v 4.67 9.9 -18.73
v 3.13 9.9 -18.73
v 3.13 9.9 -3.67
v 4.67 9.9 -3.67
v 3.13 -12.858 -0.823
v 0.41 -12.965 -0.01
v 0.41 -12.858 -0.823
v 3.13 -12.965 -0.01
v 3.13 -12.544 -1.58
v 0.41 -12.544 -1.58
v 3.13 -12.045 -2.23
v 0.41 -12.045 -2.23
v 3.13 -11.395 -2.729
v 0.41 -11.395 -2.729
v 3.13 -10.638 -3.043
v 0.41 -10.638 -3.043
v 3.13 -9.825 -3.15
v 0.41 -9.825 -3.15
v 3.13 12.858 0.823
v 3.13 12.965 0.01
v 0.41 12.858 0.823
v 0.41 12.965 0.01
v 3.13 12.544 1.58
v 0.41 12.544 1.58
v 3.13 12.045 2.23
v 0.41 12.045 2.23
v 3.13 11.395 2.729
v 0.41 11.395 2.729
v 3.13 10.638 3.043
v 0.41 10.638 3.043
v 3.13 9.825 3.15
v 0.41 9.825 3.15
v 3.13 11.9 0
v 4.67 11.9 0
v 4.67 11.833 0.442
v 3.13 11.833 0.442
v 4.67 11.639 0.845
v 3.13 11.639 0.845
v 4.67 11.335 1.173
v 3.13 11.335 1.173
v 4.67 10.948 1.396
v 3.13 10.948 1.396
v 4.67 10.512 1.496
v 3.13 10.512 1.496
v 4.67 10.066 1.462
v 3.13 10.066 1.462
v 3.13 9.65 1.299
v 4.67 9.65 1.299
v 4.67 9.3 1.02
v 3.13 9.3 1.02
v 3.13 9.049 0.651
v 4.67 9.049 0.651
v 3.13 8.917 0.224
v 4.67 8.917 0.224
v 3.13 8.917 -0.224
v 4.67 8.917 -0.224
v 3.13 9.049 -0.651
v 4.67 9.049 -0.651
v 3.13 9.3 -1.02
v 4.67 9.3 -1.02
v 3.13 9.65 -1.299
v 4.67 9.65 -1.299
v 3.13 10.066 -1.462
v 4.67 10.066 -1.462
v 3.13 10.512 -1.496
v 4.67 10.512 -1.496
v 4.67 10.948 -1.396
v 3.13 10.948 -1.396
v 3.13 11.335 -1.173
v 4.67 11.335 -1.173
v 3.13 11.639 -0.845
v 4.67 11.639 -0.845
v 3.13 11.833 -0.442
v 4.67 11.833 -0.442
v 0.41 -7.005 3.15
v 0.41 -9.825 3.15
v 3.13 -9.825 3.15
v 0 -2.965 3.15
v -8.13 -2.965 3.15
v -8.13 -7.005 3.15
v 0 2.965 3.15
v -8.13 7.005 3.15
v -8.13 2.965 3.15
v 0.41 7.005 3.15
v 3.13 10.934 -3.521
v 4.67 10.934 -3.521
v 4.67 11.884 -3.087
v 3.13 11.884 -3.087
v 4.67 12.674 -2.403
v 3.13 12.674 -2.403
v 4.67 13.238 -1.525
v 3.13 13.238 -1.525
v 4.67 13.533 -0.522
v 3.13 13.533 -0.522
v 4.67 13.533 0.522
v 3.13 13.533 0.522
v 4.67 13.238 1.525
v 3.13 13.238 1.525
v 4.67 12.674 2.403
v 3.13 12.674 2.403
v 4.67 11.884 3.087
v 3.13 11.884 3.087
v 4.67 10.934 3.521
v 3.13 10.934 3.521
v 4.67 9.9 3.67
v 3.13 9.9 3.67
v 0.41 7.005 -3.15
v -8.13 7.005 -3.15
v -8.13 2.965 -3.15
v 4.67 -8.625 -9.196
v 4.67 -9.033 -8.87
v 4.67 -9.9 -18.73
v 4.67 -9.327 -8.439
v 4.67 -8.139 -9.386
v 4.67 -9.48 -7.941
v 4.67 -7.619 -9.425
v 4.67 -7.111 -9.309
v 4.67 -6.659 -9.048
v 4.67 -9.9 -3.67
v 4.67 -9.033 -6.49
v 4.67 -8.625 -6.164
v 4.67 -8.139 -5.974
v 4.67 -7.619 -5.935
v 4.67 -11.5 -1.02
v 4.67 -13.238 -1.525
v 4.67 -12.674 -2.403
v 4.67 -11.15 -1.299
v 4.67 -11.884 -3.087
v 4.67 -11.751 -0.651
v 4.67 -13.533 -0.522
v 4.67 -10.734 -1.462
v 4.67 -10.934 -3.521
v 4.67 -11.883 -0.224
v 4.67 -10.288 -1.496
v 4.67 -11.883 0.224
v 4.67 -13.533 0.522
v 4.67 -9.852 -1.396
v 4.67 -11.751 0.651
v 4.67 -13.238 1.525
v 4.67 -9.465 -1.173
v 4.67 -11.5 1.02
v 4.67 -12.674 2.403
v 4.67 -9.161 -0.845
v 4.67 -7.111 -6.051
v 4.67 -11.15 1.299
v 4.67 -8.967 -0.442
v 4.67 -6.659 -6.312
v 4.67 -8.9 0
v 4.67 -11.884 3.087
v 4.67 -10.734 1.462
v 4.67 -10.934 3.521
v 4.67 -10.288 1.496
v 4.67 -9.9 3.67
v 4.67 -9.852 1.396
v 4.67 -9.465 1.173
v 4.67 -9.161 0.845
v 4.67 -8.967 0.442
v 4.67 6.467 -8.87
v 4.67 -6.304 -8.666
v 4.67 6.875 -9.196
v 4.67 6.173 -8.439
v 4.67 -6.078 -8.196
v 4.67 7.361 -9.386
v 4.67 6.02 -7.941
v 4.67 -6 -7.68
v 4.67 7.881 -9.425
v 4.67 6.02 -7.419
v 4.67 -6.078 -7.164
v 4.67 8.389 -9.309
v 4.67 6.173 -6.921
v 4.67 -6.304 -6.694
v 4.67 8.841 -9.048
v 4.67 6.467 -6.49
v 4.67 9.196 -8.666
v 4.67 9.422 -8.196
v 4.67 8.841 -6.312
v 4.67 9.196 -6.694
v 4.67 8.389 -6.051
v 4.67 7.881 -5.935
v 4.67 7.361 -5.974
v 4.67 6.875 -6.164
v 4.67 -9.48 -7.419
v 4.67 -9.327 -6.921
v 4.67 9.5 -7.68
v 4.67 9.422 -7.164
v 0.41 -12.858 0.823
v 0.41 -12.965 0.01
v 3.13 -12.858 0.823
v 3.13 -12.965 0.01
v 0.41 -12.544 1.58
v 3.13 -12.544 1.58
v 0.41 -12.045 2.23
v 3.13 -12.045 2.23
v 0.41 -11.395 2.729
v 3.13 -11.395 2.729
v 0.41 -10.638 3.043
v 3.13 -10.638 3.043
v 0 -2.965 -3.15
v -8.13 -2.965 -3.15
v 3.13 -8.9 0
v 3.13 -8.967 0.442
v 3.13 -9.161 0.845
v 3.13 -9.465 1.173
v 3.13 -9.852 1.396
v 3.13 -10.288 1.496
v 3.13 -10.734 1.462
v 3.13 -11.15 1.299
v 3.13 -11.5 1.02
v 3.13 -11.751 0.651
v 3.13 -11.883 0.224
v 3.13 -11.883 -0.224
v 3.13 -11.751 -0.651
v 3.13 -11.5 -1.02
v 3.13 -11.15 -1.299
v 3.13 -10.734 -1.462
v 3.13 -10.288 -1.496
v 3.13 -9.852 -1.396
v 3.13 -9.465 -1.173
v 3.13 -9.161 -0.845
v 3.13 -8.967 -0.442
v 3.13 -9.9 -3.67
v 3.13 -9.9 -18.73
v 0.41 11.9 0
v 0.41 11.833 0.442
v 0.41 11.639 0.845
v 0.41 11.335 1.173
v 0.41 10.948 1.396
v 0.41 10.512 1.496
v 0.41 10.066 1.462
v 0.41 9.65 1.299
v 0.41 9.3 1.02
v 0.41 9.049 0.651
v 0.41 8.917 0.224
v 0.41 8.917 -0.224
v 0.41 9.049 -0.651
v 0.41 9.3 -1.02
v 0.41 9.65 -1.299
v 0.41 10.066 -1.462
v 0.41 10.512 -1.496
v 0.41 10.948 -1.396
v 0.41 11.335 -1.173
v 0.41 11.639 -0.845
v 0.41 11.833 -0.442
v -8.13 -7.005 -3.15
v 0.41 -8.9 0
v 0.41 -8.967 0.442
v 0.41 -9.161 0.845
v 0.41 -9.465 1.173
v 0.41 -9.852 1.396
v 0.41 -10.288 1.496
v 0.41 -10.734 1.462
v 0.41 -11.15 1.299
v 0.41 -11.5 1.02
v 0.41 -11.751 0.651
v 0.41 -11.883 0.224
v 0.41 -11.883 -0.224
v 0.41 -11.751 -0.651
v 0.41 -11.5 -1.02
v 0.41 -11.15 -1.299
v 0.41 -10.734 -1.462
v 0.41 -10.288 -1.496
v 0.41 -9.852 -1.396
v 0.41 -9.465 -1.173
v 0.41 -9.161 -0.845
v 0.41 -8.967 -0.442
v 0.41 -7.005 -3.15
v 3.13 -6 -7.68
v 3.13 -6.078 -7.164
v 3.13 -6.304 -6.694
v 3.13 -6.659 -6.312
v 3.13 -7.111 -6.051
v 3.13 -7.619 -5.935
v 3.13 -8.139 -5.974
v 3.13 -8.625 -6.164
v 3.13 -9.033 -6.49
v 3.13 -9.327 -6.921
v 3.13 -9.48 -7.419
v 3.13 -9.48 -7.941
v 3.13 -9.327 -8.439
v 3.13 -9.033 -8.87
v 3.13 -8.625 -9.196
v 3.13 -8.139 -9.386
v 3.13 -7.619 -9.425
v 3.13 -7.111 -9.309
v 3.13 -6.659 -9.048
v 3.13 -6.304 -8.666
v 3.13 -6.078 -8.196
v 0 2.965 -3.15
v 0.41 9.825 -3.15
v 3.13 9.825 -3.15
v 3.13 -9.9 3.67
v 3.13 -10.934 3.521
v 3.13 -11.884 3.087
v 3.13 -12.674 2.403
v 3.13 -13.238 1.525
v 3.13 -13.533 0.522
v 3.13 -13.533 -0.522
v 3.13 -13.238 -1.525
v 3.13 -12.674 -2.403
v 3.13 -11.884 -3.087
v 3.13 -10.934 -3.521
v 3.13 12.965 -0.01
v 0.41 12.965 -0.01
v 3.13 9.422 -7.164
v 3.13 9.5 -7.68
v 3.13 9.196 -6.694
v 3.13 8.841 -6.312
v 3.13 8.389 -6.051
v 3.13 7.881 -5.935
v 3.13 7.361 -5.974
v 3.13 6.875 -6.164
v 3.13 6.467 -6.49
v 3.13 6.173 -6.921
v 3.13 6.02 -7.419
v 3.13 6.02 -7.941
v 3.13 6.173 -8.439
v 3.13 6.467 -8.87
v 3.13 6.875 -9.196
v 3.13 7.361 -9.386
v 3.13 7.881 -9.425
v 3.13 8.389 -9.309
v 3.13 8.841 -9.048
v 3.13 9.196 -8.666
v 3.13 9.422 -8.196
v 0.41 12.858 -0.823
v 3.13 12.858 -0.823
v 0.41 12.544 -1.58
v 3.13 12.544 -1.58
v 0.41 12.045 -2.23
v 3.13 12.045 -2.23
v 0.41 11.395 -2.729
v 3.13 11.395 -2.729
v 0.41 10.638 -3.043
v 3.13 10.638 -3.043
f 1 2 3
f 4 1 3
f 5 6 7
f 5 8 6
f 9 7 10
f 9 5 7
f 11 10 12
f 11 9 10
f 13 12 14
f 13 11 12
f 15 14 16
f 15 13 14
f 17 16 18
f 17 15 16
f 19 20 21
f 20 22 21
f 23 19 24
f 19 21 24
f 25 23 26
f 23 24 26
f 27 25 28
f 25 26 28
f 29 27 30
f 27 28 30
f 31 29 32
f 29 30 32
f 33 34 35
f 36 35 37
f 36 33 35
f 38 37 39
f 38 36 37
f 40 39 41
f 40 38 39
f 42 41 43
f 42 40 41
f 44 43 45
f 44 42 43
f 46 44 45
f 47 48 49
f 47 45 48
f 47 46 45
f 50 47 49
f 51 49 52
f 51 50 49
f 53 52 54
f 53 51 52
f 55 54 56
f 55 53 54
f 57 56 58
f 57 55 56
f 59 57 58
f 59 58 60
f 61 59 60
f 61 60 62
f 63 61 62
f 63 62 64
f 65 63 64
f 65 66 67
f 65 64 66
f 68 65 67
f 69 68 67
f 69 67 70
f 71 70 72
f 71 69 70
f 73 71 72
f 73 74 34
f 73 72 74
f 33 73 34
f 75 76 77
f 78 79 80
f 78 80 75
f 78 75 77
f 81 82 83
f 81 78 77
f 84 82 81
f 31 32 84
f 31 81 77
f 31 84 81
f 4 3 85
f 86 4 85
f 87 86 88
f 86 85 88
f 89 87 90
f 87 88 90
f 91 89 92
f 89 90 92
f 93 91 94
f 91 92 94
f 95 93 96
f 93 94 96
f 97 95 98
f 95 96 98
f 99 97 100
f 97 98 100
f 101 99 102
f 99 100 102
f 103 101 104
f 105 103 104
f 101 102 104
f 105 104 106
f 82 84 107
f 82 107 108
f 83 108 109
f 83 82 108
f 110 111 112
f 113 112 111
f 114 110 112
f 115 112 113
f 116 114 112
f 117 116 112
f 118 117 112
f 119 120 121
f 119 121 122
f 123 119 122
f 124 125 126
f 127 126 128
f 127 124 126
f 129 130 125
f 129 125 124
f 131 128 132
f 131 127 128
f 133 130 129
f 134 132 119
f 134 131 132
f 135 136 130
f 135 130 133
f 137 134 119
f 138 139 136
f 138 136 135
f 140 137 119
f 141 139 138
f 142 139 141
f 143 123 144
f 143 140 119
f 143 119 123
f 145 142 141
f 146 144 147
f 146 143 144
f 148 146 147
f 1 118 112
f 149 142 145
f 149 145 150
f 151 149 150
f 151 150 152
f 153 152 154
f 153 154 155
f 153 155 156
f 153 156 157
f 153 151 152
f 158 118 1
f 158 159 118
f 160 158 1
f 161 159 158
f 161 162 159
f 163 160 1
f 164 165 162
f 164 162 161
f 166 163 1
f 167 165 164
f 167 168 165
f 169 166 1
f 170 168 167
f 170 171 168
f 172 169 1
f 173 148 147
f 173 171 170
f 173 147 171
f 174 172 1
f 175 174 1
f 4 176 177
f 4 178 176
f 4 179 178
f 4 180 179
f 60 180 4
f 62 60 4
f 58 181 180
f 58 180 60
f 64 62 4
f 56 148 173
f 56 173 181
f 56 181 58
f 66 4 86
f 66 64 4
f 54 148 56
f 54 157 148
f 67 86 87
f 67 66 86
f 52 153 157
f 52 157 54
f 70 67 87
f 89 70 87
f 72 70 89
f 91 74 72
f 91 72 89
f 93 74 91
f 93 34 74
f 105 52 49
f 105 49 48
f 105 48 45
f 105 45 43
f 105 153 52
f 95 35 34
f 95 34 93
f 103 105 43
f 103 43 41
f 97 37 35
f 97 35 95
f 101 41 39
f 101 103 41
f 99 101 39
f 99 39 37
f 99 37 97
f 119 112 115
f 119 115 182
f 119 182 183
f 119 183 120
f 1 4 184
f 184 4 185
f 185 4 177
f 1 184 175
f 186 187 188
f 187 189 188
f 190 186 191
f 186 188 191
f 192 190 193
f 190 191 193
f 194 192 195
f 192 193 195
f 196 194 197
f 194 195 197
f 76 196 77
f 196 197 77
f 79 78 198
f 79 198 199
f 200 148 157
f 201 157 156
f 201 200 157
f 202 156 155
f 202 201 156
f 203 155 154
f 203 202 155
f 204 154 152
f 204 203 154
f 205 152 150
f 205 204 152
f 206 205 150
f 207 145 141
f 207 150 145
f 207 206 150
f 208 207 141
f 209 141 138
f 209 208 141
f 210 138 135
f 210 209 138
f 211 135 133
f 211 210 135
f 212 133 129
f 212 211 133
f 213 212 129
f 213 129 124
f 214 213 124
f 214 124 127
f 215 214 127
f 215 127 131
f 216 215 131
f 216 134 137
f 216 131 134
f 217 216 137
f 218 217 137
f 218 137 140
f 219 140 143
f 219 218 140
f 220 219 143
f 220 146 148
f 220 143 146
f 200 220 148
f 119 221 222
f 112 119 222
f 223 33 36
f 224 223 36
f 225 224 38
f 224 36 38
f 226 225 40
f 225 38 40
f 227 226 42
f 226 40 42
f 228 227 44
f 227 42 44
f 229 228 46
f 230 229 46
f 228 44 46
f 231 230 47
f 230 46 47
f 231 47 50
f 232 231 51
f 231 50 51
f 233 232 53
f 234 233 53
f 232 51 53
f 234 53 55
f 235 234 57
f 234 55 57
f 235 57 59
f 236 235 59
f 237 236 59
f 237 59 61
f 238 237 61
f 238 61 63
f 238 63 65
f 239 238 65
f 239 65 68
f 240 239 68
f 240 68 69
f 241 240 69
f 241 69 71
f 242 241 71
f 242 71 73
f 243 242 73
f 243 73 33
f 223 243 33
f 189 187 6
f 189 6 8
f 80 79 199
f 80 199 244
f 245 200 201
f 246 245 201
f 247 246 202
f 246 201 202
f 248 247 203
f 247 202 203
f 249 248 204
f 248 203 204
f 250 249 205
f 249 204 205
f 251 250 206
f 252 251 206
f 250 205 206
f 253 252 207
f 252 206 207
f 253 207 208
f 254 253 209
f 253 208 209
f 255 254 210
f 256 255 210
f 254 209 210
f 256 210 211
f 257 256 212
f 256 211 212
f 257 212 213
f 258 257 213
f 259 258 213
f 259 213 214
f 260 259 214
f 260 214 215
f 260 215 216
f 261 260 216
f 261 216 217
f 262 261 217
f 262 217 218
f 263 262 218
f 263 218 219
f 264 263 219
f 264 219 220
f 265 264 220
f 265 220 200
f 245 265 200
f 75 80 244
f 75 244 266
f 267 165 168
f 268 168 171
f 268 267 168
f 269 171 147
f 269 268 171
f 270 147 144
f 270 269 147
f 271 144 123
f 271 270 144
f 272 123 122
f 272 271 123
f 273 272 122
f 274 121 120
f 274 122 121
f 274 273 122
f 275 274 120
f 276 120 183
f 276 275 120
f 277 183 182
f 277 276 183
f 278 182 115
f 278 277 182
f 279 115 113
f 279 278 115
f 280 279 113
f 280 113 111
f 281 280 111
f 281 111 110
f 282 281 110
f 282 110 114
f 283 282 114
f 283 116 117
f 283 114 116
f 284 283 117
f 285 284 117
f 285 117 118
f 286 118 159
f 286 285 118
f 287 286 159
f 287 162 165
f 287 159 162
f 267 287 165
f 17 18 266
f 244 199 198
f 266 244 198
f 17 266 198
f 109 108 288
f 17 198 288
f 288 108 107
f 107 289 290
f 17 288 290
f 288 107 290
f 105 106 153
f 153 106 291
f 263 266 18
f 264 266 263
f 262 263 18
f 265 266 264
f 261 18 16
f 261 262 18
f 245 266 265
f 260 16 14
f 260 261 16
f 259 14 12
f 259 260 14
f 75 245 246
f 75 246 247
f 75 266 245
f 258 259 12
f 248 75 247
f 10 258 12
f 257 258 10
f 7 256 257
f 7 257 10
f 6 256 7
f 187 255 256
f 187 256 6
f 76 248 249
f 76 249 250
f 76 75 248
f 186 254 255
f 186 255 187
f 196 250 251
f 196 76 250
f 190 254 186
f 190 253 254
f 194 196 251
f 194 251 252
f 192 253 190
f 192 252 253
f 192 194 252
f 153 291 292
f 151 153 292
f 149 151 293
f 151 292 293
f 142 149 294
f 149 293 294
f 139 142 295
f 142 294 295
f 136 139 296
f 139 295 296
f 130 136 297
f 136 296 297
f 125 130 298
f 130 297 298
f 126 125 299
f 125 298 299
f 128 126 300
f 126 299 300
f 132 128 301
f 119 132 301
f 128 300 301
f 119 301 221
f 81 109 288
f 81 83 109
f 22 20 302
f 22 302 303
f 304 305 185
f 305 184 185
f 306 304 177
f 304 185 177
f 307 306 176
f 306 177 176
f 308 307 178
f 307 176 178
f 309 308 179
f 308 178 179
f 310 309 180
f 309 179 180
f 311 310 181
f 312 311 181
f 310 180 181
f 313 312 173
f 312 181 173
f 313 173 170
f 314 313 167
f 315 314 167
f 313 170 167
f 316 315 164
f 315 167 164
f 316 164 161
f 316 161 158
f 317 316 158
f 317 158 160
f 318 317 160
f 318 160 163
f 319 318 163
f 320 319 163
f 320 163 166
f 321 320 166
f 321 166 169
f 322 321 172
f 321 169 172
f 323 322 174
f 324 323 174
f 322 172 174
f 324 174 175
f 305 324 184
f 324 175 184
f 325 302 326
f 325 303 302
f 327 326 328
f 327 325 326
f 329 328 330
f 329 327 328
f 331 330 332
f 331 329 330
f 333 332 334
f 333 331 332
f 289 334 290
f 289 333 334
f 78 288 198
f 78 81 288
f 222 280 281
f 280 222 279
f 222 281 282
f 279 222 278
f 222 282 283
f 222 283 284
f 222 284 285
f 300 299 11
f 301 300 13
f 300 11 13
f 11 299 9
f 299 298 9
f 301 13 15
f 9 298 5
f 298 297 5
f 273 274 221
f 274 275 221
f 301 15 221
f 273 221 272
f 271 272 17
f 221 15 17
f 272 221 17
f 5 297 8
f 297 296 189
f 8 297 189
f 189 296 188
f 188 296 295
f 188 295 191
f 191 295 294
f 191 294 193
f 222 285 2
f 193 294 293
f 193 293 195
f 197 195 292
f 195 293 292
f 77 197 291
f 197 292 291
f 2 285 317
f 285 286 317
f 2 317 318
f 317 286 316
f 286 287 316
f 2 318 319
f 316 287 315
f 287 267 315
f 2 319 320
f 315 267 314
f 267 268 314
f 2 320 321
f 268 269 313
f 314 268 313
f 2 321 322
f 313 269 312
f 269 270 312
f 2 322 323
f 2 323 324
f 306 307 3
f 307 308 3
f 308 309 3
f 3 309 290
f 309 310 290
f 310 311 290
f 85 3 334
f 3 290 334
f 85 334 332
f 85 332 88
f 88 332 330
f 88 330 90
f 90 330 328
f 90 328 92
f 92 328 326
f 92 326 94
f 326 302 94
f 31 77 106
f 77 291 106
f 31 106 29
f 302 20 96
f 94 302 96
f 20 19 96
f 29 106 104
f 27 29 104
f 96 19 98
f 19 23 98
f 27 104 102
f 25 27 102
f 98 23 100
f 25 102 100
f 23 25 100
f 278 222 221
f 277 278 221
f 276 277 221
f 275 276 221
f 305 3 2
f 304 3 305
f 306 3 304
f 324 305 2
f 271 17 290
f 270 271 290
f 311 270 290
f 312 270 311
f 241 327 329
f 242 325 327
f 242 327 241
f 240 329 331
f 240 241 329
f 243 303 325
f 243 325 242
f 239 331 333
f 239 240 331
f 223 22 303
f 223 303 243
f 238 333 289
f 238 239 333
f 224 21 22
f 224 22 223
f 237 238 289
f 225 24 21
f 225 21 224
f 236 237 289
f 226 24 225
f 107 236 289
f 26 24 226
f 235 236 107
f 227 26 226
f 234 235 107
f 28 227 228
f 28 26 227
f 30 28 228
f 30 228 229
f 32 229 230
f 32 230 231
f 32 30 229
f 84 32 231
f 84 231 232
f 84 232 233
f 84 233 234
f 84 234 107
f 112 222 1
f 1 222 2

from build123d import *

# Parameters (mm, degrees)
F1_DEPTH = 3.15
F2_R     = 3.14
F5_DEPTH = 1.54
F4_R     = 1.5
F4_R_2   = 1.75
F6_DEPTH = 12.5


with BuildPart() as f1:
    # F0 (on Top) → F1 (new body, symmetric)
    with BuildSketch(Plane.XY):
        Polygon((0, 2.965), (0, 0), (0, -2.965), (-8.13, -2.965), (-8.13, -7.005), (0.41, -7.005), (0.41, -12.965), (3.13, -12.965), (3.13, 0), (3.13, 12.965), (0.41, 12.965), (0.41, 7.005), (-8.13, 7.005), (-8.13, 2.965), align=None)
    extrude(amount=F1_DEPTH, both=True)

    # F2
    f2_edges = [f1.edges().sort_by_distance(p)[0] for p in [
        (1.77, 12.965, 3.15),
        (1.77, 12.965, -3.15),
        (1.77, -12.965, 3.15),
        (1.77, -12.965, -3.15),
    ]]
    fillet(f2_edges, radius=F2_R)

    # F3 (on face) → F5 (join)
    with BuildSketch(Plane.YZ.offset(3.13)):
        with BuildLine():
            Line((-9.9, -3.67), (-9.9, -18.73))
            Line((-9.9, -18.73), (9.9, -18.73))
            Line((9.9, -18.73), (9.9, -3.67))
            ThreePointArc((9.9, -3.67), (13.57, 0), (9.9, 3.67))
            Line((9.9, 3.67), (-9.9, 3.67))
            ThreePointArc((-9.9, 3.67), (-13.57, 0), (-9.9, -3.67))
        make_face()
    extrude(amount=F5_DEPTH)

    # F4 (on face) → F6 (cut, symmetric)
    with BuildSketch(Plane.YZ.offset(3.13)):
        with Locations((-10.4, 0)):
            Circle(F4_R)
        with Locations((10.4, 0)):
            Circle(F4_R)
        with Locations((-7.75, -7.68)):
            Circle(F4_R_2)
        with Locations((7.75, -7.68)):
            Circle(F4_R_2)
    extrude(amount=F6_DEPTH, both=True, mode=Mode.SUBTRACT)


solid = f1.part
